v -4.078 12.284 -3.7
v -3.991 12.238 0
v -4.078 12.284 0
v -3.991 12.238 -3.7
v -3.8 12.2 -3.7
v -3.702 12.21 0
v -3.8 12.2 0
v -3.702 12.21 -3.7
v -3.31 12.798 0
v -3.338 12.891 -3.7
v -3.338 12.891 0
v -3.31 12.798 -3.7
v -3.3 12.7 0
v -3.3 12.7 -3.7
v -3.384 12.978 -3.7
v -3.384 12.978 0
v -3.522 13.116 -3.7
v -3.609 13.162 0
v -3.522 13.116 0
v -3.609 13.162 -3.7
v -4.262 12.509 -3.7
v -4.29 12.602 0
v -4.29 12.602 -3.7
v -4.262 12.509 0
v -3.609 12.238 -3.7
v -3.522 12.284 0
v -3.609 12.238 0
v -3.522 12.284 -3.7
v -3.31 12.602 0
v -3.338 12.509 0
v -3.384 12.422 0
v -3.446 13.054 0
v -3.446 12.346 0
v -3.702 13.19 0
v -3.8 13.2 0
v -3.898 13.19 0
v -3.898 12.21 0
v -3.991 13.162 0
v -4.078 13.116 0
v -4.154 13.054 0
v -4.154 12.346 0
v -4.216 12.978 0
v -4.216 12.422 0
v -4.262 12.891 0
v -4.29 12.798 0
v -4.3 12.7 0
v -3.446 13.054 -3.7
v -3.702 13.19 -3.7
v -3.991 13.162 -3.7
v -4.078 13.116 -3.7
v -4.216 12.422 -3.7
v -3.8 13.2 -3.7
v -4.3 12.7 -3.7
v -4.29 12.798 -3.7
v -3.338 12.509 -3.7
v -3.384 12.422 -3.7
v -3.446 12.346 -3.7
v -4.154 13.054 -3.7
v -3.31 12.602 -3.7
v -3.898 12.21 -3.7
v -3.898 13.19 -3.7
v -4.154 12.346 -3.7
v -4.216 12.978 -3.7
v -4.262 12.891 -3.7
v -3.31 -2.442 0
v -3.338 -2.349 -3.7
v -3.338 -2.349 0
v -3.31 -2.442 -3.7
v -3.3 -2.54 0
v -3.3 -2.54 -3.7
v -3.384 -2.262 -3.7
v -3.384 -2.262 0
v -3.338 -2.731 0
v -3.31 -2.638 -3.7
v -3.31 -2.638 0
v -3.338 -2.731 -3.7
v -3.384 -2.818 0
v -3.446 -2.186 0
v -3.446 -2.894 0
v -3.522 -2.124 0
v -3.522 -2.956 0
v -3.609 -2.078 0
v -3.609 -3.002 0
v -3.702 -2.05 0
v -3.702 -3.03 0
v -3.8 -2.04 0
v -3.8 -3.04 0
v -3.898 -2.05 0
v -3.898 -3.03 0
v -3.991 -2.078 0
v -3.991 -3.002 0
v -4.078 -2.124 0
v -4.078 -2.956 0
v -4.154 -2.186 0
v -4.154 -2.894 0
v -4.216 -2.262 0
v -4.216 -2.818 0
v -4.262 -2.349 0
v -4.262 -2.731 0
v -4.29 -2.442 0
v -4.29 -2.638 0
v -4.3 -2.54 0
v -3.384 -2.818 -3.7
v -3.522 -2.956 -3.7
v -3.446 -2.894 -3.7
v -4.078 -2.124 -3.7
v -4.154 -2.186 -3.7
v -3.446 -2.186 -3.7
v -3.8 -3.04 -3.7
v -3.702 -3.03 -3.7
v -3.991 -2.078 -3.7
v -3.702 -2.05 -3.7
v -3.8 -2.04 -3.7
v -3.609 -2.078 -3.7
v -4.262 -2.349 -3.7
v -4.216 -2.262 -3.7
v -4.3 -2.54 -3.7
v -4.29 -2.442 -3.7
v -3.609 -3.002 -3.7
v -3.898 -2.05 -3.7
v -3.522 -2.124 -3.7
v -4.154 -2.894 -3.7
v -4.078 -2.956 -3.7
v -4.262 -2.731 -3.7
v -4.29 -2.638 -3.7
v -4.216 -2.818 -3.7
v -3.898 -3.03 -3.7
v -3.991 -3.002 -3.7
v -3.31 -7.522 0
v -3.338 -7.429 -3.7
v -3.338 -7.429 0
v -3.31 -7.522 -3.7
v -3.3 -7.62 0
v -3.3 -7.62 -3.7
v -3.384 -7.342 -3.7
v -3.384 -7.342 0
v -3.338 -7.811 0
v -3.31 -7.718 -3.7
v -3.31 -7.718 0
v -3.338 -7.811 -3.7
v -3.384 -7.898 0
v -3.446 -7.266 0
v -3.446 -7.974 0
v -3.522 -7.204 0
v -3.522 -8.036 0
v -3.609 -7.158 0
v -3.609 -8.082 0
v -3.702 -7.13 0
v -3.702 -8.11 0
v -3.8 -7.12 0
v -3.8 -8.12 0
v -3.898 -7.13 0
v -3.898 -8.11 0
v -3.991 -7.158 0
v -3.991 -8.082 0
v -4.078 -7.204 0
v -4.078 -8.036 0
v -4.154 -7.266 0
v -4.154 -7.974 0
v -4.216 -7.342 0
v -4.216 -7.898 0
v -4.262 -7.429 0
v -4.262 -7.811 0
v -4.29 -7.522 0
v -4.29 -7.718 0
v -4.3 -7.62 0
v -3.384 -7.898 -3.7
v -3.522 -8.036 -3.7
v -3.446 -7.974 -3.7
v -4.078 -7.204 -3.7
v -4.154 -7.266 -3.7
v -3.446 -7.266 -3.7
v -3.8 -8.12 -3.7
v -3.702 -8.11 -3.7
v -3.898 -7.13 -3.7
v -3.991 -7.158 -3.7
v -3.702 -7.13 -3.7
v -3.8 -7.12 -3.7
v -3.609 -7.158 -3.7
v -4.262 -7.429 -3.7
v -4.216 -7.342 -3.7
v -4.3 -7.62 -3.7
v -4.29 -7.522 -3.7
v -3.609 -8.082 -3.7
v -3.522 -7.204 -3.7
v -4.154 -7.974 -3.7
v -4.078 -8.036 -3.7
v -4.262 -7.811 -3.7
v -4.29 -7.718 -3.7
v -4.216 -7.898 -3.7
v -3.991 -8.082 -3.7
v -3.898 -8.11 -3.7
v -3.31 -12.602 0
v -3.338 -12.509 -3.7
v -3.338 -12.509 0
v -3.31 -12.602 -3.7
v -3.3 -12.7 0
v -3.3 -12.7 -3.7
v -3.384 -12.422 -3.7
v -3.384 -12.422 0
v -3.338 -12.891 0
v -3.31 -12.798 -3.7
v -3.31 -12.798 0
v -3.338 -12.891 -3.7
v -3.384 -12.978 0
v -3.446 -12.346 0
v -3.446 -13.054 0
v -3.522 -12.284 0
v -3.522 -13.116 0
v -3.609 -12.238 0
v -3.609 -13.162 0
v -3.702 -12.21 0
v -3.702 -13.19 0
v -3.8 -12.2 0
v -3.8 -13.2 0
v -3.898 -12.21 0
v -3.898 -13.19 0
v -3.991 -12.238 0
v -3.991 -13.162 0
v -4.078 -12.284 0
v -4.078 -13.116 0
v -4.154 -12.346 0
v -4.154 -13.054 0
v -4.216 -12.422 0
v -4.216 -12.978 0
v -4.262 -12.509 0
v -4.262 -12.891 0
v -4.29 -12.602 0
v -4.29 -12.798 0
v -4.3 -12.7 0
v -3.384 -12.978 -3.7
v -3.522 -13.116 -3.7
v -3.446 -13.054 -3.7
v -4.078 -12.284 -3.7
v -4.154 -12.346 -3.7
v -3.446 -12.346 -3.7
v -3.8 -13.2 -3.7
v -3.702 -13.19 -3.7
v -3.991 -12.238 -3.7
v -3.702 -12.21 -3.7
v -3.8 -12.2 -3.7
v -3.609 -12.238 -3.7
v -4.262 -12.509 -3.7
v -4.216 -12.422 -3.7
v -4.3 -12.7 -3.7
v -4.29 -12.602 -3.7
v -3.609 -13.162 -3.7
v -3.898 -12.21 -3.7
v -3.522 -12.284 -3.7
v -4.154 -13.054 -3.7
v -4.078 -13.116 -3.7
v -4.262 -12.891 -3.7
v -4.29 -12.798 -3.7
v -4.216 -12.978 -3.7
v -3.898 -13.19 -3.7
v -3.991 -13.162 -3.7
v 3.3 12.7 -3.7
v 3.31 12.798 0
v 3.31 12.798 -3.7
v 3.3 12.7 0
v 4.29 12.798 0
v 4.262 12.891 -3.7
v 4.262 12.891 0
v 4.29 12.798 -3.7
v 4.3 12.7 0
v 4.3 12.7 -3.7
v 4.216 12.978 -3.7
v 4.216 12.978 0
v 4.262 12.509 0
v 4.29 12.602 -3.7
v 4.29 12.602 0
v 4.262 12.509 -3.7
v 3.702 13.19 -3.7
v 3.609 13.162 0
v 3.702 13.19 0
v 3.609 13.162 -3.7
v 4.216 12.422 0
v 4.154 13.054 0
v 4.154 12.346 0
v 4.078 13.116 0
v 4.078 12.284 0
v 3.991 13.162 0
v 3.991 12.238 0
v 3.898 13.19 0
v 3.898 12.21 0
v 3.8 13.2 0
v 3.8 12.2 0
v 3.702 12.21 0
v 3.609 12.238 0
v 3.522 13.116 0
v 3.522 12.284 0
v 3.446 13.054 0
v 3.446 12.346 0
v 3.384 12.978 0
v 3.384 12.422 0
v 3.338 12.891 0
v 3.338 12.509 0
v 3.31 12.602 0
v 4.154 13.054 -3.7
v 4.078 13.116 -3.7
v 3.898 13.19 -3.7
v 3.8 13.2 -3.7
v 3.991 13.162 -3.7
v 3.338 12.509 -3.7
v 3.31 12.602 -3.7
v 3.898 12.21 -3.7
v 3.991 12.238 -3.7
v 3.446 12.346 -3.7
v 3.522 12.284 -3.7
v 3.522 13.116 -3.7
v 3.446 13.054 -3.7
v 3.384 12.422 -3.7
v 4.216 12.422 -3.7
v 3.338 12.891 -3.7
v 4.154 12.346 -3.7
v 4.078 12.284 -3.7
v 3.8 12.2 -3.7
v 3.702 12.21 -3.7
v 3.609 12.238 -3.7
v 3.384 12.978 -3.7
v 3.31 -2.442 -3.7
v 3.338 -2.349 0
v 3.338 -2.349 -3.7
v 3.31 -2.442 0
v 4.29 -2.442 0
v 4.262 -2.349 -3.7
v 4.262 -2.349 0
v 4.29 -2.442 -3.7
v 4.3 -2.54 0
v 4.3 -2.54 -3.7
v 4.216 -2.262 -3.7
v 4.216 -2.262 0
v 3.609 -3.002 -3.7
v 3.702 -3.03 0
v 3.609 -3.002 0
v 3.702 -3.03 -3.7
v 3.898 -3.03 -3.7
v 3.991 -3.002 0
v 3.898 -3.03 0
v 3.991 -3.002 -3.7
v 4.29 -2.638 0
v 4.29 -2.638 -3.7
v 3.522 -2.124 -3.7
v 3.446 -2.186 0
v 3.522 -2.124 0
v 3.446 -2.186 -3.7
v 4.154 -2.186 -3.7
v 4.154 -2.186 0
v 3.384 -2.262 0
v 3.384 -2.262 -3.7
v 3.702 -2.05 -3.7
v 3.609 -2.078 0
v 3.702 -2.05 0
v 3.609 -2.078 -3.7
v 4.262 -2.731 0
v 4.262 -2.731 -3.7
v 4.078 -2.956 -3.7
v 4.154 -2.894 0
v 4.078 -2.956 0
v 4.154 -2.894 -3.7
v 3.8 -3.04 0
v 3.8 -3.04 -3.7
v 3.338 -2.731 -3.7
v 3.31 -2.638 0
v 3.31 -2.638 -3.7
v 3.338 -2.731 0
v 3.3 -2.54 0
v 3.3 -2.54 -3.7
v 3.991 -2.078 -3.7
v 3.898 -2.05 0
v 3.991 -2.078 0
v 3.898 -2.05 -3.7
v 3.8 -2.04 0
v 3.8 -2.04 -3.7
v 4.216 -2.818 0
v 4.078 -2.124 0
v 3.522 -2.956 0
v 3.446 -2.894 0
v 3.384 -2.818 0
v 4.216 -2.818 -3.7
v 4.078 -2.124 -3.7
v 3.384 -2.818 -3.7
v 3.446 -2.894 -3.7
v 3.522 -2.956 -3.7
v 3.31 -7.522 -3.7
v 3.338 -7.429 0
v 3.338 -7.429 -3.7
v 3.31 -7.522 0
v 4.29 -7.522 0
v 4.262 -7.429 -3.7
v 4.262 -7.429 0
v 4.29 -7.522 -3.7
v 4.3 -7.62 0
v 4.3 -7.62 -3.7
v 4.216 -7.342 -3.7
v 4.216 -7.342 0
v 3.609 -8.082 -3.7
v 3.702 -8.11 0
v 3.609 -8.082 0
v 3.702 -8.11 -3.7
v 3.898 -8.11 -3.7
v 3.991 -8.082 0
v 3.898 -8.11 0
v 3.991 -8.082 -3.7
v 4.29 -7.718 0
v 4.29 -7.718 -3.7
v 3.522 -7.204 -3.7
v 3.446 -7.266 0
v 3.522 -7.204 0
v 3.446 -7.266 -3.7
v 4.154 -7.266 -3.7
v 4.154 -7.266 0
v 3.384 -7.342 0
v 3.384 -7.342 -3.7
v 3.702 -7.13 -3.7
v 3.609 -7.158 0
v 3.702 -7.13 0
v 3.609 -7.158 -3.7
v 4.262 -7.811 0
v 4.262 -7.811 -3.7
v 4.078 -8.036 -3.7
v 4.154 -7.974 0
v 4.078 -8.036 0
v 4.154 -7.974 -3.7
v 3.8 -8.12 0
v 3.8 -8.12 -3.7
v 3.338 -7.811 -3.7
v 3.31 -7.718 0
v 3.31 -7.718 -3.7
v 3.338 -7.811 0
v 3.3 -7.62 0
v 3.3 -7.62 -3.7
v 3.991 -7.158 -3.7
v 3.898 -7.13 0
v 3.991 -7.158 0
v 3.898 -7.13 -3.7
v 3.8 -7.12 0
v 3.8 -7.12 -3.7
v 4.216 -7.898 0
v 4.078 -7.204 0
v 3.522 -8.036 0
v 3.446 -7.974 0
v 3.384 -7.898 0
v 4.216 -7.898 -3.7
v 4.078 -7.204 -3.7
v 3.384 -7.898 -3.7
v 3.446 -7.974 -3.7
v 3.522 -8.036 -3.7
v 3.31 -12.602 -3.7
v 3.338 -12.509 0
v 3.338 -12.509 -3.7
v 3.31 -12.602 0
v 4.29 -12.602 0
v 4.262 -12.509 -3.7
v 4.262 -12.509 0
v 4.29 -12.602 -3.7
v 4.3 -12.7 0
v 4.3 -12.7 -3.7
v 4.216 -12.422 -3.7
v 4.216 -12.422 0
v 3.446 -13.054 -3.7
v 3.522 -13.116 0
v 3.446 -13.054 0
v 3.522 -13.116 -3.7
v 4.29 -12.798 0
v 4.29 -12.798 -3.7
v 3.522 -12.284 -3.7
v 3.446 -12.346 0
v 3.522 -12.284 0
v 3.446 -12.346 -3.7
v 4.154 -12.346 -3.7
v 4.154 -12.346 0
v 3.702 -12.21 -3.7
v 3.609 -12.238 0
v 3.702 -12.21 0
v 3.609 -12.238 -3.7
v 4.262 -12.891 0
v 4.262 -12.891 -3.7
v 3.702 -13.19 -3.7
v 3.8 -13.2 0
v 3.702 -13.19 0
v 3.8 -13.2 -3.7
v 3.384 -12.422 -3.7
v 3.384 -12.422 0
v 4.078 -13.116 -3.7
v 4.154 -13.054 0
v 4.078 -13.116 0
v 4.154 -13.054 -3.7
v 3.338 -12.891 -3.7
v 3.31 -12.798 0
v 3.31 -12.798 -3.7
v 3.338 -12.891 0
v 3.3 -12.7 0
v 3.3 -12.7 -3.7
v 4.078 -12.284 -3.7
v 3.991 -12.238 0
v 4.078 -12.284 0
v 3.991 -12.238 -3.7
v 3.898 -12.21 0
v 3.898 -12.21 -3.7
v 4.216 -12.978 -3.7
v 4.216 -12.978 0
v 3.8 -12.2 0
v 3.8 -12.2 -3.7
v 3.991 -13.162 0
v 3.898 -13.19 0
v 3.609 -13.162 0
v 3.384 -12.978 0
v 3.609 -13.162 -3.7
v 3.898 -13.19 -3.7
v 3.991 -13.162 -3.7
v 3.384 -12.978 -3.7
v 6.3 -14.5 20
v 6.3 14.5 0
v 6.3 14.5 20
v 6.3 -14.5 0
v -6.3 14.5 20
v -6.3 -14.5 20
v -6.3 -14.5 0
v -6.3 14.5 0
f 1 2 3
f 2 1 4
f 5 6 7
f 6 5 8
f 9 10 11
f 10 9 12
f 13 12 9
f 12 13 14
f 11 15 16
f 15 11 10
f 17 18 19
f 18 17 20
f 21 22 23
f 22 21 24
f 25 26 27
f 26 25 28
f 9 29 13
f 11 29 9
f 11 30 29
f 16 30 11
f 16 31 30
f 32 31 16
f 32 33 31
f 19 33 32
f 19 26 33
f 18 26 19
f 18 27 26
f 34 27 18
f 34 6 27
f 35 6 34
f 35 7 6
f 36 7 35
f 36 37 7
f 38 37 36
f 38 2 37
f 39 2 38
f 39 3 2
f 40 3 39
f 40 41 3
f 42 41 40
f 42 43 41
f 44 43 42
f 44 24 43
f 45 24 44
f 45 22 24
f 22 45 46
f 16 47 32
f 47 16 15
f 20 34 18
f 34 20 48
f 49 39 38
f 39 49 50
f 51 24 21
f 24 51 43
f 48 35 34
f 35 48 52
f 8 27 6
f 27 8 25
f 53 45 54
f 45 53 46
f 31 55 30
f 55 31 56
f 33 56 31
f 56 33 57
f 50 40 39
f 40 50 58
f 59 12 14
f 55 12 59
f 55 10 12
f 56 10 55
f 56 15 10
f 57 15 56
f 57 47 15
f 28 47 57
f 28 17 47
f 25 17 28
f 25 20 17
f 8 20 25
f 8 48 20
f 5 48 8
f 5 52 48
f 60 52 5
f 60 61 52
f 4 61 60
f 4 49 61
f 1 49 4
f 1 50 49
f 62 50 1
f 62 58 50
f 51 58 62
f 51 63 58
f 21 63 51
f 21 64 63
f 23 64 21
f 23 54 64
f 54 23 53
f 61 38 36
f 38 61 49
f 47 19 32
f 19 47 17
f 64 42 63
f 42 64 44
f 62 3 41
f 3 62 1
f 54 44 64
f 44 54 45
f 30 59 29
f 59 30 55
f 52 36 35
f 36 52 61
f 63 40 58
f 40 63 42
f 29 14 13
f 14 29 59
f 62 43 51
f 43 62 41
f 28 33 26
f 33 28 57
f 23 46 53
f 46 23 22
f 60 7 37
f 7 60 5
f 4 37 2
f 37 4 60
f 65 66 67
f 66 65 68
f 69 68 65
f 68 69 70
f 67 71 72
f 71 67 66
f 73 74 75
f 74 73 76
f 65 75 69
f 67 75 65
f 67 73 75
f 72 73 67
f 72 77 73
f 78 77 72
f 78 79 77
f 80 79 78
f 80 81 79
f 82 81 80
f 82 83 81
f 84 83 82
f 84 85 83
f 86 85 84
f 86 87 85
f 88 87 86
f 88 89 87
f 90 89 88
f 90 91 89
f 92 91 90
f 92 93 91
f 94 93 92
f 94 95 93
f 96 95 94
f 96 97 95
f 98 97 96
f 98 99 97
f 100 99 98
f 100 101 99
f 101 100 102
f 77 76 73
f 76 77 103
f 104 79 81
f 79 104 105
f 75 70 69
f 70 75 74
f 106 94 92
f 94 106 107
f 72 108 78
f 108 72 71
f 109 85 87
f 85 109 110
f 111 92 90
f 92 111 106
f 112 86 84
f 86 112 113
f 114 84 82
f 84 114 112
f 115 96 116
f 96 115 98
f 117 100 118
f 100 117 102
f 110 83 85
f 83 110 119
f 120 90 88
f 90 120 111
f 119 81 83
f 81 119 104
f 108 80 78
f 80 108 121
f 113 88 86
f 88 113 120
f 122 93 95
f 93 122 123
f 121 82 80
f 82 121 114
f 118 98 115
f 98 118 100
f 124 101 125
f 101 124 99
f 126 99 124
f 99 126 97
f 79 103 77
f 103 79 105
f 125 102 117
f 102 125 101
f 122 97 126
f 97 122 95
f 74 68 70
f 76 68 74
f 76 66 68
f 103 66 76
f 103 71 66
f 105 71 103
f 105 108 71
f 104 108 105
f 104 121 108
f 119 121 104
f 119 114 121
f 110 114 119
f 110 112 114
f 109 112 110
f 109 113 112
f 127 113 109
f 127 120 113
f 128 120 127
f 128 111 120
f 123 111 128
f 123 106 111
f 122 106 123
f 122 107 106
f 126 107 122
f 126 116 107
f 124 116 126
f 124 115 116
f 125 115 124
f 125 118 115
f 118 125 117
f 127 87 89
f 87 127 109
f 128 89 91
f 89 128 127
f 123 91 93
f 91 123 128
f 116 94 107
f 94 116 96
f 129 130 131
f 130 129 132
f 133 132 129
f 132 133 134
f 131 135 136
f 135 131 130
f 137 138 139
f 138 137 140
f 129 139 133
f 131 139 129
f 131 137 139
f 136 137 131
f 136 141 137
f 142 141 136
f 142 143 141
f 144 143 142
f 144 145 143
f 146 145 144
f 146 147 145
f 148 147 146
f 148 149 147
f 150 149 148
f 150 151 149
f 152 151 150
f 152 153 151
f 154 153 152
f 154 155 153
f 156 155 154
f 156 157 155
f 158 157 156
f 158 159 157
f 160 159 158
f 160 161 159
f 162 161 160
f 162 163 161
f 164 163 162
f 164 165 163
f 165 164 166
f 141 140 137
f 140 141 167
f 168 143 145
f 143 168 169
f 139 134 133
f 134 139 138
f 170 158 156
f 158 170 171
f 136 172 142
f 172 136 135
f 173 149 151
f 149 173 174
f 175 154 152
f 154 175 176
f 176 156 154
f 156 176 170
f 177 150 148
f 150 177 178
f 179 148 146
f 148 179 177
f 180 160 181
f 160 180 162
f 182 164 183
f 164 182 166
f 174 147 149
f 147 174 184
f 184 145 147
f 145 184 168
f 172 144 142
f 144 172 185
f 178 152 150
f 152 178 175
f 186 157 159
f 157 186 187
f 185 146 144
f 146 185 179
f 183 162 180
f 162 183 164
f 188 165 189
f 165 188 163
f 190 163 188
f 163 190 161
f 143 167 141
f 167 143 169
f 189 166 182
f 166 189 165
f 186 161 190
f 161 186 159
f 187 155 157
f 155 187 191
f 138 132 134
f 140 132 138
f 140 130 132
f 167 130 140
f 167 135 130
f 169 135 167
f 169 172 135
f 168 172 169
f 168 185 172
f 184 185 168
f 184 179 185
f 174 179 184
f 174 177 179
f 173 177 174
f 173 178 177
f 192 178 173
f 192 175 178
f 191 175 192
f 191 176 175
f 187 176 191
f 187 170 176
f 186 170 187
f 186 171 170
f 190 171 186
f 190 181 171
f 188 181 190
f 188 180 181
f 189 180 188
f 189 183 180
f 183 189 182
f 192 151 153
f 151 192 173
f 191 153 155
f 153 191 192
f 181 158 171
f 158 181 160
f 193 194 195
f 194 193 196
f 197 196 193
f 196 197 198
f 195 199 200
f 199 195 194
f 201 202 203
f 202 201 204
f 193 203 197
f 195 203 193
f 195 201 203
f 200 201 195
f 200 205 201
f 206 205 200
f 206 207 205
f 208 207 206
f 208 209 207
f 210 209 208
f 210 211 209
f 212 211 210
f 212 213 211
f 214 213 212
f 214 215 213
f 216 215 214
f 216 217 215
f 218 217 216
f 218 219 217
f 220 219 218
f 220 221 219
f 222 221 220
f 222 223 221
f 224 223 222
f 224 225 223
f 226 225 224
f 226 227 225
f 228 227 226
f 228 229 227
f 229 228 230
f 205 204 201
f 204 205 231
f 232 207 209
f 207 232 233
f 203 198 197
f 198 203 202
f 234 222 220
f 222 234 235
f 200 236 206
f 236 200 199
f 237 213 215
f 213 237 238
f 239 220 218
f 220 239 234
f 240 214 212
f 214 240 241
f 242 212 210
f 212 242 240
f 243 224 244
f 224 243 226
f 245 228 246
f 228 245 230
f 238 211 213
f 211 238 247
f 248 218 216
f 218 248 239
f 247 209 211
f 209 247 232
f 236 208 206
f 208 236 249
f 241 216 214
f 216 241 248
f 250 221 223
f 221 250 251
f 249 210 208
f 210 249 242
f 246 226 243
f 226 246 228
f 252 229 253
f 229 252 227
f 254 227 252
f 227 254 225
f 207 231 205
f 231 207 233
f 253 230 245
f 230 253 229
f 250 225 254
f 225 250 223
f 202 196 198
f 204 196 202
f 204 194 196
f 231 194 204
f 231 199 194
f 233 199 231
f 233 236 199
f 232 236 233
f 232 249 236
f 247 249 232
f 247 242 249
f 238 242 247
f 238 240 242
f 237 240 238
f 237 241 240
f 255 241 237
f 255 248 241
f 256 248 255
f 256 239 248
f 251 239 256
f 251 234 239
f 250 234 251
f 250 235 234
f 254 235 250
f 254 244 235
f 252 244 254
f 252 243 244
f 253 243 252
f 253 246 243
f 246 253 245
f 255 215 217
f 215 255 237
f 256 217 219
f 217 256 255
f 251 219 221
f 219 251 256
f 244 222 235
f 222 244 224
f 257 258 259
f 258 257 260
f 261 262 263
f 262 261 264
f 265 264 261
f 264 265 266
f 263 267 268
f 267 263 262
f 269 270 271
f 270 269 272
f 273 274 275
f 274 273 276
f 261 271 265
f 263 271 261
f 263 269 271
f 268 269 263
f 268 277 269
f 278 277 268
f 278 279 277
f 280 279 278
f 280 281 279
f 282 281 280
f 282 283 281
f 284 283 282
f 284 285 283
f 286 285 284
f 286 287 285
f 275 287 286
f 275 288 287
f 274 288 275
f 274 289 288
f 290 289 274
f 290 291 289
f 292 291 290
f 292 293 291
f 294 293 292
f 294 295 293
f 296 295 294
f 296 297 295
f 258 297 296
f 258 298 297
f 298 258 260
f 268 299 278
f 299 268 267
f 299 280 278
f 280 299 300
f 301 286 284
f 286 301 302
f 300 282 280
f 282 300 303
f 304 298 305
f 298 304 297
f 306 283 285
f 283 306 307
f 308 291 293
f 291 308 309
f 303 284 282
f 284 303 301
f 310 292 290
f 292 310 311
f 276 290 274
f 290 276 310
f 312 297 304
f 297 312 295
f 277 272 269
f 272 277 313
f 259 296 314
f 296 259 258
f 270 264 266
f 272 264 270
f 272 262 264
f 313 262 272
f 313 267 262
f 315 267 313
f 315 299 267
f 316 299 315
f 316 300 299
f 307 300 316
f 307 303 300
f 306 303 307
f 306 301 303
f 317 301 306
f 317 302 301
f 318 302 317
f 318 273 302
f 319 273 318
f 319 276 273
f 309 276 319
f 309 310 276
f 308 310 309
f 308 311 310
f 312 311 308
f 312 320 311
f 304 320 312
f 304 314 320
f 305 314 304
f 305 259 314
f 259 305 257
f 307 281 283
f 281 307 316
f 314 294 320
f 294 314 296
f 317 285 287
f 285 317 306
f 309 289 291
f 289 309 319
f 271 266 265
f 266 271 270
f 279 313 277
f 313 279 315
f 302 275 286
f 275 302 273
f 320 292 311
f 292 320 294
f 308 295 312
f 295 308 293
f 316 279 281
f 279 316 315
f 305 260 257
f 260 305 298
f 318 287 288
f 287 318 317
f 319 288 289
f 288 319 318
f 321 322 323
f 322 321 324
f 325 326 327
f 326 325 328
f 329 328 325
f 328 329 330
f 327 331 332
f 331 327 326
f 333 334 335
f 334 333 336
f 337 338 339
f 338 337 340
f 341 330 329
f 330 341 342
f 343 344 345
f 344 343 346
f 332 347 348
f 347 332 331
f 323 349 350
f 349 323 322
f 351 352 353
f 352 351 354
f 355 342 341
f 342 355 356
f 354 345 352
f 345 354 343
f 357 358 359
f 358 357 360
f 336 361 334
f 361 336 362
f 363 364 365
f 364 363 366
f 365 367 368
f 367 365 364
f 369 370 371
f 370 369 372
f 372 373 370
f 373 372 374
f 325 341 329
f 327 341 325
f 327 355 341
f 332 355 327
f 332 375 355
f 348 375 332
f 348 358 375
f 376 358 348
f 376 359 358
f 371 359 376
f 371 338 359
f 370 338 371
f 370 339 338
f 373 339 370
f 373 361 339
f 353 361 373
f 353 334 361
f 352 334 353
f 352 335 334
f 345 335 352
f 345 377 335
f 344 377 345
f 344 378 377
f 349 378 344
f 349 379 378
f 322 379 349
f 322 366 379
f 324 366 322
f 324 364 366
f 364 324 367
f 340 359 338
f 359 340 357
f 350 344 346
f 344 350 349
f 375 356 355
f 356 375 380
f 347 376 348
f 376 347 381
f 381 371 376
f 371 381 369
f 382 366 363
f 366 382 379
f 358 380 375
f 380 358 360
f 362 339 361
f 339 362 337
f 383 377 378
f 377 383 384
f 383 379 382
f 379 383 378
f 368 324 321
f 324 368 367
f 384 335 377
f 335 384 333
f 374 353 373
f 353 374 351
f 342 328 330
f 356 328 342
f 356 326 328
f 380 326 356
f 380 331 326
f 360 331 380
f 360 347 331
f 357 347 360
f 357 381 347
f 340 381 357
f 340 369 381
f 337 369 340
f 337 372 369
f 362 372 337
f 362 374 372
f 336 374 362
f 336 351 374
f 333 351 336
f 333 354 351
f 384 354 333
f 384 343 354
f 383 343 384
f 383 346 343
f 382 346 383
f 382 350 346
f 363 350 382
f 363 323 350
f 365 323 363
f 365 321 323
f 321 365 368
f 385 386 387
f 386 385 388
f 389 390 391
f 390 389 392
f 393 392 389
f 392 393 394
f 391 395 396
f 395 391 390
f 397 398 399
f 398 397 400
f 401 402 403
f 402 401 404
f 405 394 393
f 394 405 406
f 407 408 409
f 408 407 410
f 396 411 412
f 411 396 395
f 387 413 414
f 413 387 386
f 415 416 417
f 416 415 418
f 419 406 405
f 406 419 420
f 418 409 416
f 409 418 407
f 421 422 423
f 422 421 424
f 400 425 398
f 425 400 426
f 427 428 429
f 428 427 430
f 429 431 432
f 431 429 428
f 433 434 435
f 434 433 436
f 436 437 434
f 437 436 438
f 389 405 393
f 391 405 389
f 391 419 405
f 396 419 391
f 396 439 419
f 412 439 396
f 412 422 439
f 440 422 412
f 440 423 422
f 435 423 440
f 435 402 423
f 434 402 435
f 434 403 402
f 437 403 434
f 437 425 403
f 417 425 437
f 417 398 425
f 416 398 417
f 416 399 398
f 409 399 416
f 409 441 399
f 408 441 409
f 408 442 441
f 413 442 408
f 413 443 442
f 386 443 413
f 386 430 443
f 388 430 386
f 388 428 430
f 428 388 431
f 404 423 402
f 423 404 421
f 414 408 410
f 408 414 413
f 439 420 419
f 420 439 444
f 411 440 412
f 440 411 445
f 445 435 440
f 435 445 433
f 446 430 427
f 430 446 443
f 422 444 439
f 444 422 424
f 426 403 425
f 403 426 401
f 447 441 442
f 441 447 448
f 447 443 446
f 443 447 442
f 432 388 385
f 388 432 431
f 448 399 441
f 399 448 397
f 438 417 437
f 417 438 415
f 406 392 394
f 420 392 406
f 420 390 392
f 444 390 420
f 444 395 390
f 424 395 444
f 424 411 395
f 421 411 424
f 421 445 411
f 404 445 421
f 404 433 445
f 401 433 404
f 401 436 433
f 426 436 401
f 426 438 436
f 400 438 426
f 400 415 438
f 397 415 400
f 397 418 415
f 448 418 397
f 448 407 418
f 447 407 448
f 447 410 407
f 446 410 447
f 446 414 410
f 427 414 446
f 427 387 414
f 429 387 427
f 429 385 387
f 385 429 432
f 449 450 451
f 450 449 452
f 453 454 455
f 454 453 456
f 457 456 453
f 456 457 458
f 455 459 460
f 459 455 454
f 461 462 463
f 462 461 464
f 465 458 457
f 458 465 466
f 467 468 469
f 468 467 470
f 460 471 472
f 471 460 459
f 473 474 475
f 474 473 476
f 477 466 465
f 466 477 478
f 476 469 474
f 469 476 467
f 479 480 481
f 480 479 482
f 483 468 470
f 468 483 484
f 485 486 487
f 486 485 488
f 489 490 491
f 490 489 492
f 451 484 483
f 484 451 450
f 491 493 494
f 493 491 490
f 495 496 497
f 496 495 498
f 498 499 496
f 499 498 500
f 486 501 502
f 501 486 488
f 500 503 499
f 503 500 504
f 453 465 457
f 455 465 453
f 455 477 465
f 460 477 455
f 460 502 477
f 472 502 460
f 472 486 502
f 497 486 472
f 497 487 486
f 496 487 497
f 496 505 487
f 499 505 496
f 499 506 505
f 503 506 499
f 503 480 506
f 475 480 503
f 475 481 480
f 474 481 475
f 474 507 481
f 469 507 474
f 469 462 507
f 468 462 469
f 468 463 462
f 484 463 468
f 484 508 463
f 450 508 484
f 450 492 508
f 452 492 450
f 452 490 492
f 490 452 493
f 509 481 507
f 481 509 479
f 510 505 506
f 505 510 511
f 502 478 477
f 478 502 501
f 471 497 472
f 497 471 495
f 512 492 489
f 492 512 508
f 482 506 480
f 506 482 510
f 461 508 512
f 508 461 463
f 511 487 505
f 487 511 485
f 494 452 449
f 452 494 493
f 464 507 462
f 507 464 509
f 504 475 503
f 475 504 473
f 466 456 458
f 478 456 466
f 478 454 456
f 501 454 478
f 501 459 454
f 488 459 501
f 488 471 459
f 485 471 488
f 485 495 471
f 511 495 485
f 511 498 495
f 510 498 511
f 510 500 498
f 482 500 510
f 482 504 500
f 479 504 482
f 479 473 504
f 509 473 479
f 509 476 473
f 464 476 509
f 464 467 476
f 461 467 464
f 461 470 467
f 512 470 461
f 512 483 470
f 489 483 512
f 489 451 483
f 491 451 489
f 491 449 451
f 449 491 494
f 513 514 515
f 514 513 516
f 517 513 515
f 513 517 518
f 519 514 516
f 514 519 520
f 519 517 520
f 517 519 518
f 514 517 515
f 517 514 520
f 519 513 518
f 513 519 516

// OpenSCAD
//
// CUI PR16 relay ("DIP22-like" package)
//

case_wid = 12.6;
case_len = 29;
case_hgt = 20;

row_spc = 7.6;
row_len = 25.4;
pin_spc = 2.54;

pin_len = 3.7;
pin_dia = 1.0;

$fn=32;

module pin_at( x, y) {
     translate( [x, y, 0])
	  cylinder( d=pin_dia, h=pin_len);
}

module relay() {
     translate( [-case_wid/2, -case_len/2, 0])
	  color("orange") cube( [case_wid, case_len, case_hgt]);
     // to pin 1
     translate( [-row_spc/2, row_len/2, -pin_len]) {
	  for( x=[0,row_spc]) {
	       for( y=[0, -15.24, -15.24-5.08, -15.24-5.08*2]) {
		    pin_at( x,y);
	       }
	  }	     
     }
}


relay();
